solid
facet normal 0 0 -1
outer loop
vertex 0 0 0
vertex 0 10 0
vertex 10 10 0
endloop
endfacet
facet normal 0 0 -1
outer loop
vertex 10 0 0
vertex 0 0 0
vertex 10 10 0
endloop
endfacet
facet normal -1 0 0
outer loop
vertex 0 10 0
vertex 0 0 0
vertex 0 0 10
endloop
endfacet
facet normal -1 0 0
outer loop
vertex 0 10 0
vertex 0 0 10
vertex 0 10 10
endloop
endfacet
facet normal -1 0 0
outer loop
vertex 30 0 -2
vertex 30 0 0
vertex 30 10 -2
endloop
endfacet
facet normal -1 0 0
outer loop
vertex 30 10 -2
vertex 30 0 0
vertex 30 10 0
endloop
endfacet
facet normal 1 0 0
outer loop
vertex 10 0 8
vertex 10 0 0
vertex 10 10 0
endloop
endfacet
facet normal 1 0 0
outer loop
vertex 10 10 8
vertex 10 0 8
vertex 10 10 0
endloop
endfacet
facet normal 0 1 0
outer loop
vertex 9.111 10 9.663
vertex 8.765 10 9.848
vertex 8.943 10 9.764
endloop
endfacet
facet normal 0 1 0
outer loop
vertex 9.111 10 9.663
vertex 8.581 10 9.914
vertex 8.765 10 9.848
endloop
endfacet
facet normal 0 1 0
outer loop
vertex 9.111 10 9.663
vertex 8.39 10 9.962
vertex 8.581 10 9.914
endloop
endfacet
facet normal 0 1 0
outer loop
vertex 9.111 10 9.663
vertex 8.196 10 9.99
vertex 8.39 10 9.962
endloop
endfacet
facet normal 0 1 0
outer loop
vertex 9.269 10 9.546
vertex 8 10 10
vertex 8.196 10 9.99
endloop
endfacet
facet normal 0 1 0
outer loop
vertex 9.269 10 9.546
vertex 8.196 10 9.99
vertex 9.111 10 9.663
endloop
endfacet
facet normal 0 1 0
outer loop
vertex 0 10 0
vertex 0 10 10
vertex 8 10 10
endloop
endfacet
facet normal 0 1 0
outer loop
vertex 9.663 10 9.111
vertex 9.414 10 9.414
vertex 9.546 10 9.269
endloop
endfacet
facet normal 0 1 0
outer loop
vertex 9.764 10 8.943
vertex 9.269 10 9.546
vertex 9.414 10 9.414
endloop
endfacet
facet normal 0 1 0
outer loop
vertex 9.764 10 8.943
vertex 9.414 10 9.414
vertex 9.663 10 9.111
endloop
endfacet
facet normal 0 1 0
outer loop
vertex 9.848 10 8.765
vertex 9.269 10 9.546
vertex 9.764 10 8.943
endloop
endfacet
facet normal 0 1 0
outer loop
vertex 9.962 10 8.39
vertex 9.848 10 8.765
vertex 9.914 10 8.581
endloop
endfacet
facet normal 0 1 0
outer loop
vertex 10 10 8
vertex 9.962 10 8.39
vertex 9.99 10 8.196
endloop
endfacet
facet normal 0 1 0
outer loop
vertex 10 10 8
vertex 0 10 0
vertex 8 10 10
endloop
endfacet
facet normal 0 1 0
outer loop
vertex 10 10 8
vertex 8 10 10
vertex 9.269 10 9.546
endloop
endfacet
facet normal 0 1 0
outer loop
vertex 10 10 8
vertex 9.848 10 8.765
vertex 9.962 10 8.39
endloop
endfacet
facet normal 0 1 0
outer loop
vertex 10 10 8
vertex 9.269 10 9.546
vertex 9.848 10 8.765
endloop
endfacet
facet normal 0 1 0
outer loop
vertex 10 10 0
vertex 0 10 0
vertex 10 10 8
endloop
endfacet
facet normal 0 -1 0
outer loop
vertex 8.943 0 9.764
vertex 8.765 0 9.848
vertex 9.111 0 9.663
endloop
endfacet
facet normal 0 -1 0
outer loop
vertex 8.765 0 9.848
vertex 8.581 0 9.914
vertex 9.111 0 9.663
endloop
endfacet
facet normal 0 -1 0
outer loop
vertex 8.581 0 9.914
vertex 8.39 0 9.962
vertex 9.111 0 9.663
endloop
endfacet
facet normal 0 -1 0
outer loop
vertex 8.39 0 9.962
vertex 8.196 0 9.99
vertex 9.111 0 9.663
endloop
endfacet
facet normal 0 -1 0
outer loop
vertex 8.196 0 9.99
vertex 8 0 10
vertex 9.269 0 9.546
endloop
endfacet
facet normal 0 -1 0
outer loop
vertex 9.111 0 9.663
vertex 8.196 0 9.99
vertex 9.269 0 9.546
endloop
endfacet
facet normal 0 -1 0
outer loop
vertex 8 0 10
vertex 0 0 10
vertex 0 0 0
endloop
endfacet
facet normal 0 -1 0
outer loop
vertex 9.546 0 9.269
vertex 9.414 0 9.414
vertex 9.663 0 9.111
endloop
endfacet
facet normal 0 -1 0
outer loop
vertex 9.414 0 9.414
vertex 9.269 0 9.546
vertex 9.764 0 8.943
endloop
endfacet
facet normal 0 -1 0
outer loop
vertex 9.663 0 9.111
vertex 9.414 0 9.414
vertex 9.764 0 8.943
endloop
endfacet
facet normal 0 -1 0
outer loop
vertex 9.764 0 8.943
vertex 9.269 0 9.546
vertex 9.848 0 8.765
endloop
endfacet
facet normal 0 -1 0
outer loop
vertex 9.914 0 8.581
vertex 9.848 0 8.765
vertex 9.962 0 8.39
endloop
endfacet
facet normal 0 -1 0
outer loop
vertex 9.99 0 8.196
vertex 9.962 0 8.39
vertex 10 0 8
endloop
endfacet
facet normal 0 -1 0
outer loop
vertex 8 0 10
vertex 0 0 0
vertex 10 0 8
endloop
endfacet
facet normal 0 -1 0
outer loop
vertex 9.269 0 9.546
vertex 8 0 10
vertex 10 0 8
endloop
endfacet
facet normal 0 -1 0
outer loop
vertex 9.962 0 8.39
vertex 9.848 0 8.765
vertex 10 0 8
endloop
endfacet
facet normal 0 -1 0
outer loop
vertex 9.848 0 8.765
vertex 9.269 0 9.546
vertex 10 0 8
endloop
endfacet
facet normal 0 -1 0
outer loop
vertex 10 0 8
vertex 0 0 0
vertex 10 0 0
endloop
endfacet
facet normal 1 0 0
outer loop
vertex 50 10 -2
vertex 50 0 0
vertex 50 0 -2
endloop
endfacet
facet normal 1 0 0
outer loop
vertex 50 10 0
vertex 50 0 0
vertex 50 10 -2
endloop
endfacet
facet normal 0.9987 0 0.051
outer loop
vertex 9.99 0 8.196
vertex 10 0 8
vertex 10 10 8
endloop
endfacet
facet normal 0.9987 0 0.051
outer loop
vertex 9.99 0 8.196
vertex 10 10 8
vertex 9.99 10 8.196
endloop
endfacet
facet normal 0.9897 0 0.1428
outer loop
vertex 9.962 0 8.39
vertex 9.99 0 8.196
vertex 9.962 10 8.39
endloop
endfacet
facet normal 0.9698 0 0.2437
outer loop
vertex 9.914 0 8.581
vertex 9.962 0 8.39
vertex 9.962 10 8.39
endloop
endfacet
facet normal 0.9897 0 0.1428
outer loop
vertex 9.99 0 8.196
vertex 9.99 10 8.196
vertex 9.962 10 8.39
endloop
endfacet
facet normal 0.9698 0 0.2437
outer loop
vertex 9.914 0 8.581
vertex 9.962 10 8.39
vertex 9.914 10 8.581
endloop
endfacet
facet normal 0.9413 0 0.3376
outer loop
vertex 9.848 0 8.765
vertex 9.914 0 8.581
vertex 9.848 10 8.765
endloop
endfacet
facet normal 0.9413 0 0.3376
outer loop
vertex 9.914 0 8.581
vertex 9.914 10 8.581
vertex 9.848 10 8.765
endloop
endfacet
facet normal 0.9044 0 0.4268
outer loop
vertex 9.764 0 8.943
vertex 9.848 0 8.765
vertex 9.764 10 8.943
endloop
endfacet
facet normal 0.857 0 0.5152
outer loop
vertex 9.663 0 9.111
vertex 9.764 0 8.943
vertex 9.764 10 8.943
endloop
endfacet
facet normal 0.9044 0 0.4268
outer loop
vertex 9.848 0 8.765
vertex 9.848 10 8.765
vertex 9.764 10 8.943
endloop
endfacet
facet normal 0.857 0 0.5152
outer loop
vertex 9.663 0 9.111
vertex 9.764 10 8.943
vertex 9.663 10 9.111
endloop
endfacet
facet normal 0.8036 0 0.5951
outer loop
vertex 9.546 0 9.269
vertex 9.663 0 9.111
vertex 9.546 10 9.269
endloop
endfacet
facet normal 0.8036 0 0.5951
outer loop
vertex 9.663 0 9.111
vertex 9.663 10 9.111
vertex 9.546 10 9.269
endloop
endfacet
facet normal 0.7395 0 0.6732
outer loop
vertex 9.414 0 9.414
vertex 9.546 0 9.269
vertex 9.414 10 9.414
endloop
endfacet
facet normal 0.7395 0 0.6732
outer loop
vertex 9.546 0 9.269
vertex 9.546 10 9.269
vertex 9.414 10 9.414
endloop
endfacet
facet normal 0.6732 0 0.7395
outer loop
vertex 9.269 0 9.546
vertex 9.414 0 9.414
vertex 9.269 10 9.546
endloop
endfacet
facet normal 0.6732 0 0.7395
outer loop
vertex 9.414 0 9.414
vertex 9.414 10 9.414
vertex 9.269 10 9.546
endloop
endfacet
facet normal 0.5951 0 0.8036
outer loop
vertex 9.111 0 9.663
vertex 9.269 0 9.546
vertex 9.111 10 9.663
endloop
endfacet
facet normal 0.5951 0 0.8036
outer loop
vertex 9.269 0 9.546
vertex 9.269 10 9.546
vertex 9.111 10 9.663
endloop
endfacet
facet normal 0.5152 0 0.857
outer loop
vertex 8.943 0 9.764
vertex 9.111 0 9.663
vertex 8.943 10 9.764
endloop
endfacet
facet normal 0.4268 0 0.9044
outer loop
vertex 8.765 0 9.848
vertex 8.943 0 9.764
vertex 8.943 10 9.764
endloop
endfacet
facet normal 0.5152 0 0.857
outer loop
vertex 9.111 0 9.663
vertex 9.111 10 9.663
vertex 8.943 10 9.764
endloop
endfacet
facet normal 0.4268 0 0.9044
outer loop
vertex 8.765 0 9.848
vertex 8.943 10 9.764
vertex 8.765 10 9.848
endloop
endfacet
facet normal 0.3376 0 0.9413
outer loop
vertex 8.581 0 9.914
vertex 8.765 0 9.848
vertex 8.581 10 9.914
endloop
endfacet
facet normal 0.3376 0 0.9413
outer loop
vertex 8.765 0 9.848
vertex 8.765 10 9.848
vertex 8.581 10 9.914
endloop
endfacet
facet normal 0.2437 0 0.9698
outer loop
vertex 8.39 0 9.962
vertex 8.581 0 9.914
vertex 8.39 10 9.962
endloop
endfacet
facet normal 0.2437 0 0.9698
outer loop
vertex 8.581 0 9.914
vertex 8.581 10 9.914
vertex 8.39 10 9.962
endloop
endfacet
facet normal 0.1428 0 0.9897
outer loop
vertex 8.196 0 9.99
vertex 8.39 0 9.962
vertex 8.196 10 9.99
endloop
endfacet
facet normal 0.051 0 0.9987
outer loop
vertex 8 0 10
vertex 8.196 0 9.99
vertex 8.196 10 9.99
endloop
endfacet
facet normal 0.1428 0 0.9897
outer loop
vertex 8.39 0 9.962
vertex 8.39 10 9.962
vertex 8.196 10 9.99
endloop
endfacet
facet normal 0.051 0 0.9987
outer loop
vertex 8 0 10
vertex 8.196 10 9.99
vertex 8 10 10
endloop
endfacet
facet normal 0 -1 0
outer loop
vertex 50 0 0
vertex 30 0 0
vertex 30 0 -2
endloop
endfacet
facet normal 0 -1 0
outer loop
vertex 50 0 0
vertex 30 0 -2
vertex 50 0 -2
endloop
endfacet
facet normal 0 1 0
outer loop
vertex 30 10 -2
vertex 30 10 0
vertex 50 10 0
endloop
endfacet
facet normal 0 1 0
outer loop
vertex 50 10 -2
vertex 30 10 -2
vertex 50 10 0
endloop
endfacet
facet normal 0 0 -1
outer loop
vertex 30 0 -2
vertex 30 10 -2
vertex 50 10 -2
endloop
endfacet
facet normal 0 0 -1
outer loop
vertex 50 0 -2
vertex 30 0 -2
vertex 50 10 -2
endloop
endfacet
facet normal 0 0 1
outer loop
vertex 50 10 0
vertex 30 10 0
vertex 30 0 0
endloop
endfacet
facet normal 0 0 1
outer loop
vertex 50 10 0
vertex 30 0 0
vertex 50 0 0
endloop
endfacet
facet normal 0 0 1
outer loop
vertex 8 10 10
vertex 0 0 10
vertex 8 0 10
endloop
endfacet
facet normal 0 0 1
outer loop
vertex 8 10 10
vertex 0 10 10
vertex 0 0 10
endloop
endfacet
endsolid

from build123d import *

# Parameters (mm, degrees)
SKETCH_1_W             = 10
SKETCH_1_H             = 10
EXTRUDE_1_DEPTH        = 10
FILLET_1_R             = 2
SKETCH_2_W             = 20
SKETCH_2_H             = 10
SM_BASE_FLANGE_1_DEPTH = 2


# Sheet-metal steps are written as plain solids
with BuildPart() as part:
    # Sketch 1 → 凸台-拉伸1 (new body)
    with BuildSketch(Plane.XY):
        with Locations((5, 5)):
            Rectangle(SKETCH_1_W, SKETCH_1_H)
    extrude(amount=EXTRUDE_1_DEPTH)

    # 圆角1
    fillet_1_edges = [part.edges().sort_by_distance(p)[0] for p in [
        (10, 5, 10),
    ]]
    fillet(fillet_1_edges, radius=FILLET_1_R)


with BuildPart() as body_2:
    # Sketch 2 → 基体-法兰1 (new body)
    with BuildSketch(Plane.XY):
        with Locations((40, 5)):
            Rectangle(SKETCH_2_W, SKETCH_2_H)
    extrude(amount=-SM_BASE_FLANGE_1_DEPTH)


solid = Compound([part.part, body_2.part])
